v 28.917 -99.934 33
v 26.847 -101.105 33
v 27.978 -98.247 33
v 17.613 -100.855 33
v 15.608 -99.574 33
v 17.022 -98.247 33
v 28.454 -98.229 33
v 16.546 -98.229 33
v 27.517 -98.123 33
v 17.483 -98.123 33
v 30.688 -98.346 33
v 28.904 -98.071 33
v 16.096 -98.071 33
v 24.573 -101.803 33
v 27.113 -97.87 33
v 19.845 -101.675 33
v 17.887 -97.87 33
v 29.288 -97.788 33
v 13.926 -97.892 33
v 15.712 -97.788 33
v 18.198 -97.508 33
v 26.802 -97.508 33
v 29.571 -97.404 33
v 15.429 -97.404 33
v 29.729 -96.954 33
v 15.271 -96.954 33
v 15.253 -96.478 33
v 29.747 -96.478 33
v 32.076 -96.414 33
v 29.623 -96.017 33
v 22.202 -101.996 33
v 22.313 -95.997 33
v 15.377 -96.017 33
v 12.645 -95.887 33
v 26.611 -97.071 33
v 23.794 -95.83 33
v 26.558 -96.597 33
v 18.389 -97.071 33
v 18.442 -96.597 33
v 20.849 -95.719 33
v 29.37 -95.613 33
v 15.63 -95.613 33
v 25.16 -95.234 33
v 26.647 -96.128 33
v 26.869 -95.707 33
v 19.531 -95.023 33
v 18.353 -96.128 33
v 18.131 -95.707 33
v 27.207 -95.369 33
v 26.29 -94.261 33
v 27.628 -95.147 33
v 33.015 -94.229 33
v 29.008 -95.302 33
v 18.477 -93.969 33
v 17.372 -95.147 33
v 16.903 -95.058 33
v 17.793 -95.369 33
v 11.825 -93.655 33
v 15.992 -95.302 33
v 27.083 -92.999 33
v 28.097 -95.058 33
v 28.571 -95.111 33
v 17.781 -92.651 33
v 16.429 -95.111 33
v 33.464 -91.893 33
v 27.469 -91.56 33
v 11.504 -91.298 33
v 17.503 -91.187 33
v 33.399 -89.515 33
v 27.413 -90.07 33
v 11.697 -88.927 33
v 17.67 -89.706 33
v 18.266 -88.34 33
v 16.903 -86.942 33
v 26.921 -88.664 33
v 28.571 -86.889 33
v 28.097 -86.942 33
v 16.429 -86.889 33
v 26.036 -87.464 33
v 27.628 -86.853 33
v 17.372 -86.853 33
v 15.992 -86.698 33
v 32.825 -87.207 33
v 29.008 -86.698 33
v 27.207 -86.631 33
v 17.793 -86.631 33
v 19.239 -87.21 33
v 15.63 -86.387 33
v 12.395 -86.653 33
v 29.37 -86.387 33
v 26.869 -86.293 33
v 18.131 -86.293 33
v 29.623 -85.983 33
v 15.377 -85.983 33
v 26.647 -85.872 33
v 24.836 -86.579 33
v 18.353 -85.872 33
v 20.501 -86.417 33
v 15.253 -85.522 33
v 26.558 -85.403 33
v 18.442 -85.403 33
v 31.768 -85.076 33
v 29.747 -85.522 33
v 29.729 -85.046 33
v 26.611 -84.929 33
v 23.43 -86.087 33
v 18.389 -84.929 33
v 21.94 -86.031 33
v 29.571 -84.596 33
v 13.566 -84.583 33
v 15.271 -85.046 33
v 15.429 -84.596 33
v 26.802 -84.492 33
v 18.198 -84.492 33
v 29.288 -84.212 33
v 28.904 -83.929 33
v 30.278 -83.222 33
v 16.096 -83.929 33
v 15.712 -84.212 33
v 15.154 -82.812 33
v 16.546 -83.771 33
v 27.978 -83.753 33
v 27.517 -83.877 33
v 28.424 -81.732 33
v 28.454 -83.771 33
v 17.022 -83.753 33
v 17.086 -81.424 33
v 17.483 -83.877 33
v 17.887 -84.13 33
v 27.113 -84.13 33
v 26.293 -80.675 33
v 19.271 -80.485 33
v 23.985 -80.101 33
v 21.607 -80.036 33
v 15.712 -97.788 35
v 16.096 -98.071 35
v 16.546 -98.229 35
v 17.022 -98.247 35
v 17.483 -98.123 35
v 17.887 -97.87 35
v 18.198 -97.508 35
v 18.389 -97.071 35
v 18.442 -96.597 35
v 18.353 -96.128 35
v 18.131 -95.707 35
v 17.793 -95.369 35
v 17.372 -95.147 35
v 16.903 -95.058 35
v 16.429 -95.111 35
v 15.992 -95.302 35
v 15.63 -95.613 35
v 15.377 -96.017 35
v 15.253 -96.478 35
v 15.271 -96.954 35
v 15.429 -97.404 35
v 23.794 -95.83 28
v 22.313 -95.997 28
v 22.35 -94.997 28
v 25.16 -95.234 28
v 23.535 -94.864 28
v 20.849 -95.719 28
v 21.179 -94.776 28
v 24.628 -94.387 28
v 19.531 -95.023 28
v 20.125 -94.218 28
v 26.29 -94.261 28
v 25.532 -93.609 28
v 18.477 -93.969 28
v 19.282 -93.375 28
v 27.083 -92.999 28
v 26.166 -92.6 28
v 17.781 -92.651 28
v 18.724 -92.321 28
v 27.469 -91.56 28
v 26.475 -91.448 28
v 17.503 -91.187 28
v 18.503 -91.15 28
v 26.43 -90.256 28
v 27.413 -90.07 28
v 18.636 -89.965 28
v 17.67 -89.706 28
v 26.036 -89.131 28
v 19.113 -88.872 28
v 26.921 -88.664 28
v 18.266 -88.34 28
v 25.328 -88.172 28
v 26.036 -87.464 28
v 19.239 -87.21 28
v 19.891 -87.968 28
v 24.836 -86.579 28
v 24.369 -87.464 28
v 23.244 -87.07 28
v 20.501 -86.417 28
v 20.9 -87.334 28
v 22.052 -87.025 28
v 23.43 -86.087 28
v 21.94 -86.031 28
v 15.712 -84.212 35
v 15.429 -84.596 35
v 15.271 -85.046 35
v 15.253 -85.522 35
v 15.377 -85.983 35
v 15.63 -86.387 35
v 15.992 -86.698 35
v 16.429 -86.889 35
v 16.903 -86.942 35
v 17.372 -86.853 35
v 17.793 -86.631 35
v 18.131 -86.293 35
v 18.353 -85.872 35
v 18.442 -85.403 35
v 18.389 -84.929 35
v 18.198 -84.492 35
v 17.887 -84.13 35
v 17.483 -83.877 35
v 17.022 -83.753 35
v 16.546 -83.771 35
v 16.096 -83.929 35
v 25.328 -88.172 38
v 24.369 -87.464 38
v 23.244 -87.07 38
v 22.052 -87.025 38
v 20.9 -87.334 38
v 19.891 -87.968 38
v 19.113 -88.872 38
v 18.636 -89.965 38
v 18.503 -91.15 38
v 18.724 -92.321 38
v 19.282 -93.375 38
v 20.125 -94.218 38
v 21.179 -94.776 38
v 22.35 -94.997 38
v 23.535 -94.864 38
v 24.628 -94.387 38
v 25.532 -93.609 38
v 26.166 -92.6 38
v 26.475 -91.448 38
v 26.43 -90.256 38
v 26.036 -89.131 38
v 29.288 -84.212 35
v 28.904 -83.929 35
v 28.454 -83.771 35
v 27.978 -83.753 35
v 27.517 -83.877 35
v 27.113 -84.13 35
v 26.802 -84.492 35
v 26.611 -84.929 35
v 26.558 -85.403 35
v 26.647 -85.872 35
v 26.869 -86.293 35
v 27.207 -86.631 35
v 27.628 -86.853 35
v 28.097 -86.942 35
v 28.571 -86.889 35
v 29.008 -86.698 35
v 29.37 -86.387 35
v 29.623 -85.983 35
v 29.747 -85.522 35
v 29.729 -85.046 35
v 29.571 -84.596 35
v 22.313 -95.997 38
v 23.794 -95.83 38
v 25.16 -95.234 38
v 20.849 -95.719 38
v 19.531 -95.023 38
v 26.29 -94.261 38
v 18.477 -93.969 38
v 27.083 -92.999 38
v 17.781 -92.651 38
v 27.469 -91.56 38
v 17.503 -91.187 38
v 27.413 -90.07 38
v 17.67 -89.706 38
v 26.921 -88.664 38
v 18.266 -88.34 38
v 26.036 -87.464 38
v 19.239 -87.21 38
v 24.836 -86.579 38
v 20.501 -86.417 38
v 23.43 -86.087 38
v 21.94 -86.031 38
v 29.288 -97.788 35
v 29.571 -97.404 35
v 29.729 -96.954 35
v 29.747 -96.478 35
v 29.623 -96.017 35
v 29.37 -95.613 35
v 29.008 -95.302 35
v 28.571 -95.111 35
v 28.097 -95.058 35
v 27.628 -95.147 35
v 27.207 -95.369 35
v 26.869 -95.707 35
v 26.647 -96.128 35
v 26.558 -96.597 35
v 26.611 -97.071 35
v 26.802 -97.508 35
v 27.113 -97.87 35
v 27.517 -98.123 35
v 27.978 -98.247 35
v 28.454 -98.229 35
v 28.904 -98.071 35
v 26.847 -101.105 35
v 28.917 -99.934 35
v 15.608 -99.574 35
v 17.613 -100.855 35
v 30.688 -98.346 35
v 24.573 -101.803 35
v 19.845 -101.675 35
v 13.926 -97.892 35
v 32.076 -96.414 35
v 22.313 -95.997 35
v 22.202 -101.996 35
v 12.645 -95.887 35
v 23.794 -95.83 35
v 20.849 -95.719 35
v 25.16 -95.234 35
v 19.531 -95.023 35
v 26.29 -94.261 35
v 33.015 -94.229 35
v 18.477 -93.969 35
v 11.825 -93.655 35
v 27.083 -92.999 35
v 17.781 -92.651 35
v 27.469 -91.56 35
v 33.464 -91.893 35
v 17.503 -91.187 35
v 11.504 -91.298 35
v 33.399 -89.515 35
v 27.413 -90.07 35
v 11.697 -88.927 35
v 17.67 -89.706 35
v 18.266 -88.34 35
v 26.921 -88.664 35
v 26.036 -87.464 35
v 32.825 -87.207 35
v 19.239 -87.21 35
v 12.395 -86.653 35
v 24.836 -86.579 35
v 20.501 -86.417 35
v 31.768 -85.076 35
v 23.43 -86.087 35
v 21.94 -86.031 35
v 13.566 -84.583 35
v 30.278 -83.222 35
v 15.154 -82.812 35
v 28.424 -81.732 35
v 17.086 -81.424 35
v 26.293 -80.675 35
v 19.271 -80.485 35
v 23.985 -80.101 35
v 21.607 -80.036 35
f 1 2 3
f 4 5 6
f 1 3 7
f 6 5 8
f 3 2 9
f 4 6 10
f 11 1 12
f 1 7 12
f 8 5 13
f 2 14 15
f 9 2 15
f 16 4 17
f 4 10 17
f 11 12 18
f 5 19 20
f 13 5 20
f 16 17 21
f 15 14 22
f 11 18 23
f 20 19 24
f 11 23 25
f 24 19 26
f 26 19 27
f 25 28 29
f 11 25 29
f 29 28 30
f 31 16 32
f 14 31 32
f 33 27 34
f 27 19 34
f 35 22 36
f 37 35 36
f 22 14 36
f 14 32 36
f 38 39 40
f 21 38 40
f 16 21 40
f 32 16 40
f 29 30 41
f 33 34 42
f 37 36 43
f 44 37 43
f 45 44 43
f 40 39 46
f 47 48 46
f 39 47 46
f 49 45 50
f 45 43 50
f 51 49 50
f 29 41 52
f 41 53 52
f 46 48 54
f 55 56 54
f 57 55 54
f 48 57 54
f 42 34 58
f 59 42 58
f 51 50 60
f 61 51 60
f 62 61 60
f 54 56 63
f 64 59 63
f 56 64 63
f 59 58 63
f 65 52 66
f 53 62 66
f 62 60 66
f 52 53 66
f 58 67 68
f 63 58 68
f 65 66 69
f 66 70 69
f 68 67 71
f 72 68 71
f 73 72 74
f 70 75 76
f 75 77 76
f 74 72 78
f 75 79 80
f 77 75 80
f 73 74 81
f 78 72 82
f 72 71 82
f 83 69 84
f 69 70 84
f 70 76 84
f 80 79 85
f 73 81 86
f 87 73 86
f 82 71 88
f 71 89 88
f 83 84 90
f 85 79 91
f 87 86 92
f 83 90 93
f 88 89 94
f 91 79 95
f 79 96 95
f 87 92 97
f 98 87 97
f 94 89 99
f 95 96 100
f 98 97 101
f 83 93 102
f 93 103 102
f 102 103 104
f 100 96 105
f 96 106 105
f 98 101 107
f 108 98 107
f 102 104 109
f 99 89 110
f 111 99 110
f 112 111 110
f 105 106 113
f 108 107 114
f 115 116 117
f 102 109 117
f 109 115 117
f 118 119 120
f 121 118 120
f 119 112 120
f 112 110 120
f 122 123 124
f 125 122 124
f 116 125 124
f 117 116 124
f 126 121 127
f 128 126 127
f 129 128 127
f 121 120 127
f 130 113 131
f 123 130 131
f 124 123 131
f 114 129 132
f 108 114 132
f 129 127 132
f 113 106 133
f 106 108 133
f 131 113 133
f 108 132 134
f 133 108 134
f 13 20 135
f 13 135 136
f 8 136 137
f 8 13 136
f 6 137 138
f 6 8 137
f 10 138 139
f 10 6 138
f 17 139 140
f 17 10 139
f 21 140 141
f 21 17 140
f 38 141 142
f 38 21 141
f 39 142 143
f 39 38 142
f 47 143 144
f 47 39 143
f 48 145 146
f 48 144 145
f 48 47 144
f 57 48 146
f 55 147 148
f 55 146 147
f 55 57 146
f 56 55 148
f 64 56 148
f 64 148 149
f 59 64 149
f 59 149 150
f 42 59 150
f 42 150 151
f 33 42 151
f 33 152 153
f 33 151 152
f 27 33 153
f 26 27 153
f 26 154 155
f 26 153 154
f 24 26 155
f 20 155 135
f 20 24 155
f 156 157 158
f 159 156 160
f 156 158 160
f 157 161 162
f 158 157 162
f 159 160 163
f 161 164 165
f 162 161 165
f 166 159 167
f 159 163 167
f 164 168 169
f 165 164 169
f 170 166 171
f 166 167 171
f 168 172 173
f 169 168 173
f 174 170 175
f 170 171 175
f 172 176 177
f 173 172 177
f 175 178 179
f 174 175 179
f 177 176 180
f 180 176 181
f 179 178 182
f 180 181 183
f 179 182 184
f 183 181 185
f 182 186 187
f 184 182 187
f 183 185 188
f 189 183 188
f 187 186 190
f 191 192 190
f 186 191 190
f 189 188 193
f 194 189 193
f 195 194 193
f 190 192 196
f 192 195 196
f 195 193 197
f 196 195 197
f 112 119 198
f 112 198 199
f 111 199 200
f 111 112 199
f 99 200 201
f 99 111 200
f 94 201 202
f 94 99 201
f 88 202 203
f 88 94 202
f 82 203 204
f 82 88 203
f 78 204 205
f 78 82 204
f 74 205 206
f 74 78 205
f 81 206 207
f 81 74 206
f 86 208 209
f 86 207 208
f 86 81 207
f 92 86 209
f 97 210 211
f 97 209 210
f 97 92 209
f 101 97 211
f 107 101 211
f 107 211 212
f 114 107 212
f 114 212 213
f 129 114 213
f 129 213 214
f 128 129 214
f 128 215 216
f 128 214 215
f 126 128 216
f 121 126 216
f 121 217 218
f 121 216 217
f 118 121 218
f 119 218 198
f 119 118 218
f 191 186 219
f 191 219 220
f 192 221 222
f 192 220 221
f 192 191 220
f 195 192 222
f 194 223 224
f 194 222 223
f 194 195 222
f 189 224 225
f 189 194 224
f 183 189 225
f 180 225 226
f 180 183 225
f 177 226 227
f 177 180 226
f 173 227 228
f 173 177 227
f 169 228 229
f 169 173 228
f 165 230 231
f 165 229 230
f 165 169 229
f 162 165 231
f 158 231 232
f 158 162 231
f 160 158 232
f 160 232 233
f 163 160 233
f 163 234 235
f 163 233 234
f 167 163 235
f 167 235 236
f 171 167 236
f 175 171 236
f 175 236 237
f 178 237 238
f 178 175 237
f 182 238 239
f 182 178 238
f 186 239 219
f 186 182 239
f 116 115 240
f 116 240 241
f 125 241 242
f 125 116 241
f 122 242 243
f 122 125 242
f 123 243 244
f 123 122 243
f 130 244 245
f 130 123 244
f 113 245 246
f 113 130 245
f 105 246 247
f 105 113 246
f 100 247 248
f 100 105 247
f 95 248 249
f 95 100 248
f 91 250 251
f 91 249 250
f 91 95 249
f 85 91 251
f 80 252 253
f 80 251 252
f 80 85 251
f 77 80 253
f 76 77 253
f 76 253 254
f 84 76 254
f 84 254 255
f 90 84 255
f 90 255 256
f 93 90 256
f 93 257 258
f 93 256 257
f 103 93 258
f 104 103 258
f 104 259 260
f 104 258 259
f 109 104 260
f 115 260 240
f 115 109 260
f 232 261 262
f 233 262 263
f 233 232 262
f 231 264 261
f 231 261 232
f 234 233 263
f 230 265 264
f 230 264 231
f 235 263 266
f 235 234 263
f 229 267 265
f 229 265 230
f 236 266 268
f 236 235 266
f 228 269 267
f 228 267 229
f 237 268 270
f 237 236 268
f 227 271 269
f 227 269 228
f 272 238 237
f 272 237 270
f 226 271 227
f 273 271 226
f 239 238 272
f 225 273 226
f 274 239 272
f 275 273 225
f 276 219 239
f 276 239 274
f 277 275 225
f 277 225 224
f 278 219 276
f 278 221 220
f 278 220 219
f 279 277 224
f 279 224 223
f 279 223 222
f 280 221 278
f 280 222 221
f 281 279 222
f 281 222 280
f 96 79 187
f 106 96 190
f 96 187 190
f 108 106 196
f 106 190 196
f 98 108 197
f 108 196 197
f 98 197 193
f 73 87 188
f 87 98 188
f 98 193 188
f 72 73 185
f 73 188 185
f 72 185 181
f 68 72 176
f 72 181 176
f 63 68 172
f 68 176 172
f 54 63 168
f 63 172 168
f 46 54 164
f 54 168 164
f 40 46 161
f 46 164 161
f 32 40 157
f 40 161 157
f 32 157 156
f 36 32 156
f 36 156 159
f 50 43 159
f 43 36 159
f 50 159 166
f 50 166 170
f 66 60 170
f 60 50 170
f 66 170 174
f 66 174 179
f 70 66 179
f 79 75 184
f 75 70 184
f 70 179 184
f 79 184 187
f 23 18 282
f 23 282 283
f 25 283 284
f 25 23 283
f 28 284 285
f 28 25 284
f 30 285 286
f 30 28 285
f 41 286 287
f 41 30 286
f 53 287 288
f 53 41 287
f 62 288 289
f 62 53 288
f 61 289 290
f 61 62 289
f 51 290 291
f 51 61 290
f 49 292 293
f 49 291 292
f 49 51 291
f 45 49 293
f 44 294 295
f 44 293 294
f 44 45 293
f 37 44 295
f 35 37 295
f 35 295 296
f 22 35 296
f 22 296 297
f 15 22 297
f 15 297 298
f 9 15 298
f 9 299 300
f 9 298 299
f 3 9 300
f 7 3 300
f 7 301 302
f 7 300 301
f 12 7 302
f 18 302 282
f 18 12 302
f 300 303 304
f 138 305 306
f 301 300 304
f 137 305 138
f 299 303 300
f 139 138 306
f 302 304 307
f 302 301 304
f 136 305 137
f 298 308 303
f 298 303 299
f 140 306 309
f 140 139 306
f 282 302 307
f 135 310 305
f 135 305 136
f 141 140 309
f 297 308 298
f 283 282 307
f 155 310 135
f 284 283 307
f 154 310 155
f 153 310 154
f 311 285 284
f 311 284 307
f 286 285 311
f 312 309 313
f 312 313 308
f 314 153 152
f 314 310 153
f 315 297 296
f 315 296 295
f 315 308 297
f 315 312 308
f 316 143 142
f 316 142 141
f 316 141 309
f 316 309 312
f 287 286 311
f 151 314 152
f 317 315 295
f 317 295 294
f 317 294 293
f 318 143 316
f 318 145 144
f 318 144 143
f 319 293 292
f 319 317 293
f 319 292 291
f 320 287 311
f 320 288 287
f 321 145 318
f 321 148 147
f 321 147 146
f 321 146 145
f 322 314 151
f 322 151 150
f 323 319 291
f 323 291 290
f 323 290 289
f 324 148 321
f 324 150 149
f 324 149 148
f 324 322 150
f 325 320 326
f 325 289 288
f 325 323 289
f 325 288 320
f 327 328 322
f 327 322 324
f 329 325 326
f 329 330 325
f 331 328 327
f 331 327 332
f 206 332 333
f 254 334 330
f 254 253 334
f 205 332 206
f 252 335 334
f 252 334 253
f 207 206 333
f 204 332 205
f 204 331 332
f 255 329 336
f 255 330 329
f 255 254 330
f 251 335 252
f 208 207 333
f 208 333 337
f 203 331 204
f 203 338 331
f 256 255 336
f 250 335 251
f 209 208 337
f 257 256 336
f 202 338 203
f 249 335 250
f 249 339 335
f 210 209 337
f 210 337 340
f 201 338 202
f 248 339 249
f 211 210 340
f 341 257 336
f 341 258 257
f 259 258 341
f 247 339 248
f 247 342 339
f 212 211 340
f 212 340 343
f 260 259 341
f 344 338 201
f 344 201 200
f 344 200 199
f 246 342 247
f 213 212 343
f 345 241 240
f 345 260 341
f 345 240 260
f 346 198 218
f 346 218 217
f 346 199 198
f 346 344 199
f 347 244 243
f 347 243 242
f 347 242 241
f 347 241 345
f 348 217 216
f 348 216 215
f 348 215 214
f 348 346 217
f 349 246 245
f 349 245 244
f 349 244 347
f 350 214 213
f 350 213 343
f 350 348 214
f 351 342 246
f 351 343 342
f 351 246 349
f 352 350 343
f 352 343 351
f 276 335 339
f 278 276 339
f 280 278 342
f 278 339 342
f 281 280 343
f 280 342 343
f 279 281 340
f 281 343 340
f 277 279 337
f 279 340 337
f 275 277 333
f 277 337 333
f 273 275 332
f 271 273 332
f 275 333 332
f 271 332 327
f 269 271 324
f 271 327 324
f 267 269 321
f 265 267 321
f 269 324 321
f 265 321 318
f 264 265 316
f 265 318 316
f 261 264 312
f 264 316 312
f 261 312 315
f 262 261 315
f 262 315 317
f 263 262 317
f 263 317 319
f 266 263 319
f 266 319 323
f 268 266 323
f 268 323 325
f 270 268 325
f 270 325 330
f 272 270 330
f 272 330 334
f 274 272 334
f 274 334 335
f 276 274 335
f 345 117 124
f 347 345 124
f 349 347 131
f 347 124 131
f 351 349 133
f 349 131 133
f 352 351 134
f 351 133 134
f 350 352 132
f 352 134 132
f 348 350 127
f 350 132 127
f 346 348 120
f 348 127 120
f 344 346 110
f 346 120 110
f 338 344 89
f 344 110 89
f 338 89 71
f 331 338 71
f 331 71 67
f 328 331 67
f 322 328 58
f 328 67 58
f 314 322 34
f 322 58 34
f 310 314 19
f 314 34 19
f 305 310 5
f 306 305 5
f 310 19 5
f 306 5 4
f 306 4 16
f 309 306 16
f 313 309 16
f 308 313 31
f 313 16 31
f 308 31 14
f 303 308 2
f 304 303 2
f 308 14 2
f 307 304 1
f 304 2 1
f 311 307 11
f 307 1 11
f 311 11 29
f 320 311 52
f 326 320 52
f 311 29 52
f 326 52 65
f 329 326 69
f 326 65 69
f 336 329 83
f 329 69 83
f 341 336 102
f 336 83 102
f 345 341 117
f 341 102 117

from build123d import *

# Parameters (mm, degrees)
CYLINDER019_R          = 1.6
CYLINDER019_DEPTH      = 23
ARRAY007_COUNT         = 4
CYLINDER016_R          = 4
CYLINDER016_DEPTH      = 350
CYLINDER018_R          = 5
CYLINDER018_DEPTH      = 10
CYLINDER017_R          = 11
CYLINDER017_DEPTH      = 2
CUT019_PLACEMENT_ANGLE = 45


with BuildPart() as array007:
    # Cylinder019 → Cylinder019 (new body)
    with BuildSketch(Plane(origin=(8, 0, 0), x_dir=(1, 0, 0), z_dir=(0, 0, 1))):
        Circle(CYLINDER019_R)
    extrude(amount=CYLINDER019_DEPTH)

    # Array007: Array007 ×4 about axis
    array007_axis = Axis((0, 0, 0), (0, 0, 1))


with BuildPart() as array007_1:
    add(array007.part)
    for i in range(1, ARRAY007_COUNT):
        add(array007.part.rotate(array007_axis, i * 360 / ARRAY007_COUNT))


with BuildPart() as cilindro016:
    # Cylinder016 → Cylinder016 (new body)
    with BuildSketch(Plane.XY):
        Circle(CYLINDER016_R)
    extrude(amount=CYLINDER016_DEPTH)


with BuildPart() as interior:
    # Cylinder018 → Cylinder018 (new body)
    with BuildSketch(Plane.XY):
        Circle(CYLINDER018_R)
    extrude(amount=CYLINDER018_DEPTH)


with BuildPart() as rosca_husillo:
    # Cylinder017 → Cylinder017 (new body)
    with BuildSketch(Plane.XY.offset(5)):
        Circle(CYLINDER017_R)
    extrude(amount=CYLINDER017_DEPTH)

    # Fusion018: union interior
    add(interior.part)


with BuildPart() as rosca_husillo_1:
    # Fusion018 placement: moved
    add(rosca_husillo.part.moved(Location((0, 0, 6))))

    # Cut018: cut Cilindro016
    add(cilindro016.part, mode=Mode.SUBTRACT)

    # Cut019: cut Array007
    add(array007_1.part, mode=Mode.SUBTRACT)


with BuildPart() as rosca_husillo_2:
    # Cut019 placement: moved
    add(rosca_husillo_1.part.moved(Location((22.5, -91, 22))).rotate(Axis((22.5, -91, 22), (0, 0, 1)), CUT019_PLACEMENT_ANGLE))


solid = rosca_husillo_2.part
